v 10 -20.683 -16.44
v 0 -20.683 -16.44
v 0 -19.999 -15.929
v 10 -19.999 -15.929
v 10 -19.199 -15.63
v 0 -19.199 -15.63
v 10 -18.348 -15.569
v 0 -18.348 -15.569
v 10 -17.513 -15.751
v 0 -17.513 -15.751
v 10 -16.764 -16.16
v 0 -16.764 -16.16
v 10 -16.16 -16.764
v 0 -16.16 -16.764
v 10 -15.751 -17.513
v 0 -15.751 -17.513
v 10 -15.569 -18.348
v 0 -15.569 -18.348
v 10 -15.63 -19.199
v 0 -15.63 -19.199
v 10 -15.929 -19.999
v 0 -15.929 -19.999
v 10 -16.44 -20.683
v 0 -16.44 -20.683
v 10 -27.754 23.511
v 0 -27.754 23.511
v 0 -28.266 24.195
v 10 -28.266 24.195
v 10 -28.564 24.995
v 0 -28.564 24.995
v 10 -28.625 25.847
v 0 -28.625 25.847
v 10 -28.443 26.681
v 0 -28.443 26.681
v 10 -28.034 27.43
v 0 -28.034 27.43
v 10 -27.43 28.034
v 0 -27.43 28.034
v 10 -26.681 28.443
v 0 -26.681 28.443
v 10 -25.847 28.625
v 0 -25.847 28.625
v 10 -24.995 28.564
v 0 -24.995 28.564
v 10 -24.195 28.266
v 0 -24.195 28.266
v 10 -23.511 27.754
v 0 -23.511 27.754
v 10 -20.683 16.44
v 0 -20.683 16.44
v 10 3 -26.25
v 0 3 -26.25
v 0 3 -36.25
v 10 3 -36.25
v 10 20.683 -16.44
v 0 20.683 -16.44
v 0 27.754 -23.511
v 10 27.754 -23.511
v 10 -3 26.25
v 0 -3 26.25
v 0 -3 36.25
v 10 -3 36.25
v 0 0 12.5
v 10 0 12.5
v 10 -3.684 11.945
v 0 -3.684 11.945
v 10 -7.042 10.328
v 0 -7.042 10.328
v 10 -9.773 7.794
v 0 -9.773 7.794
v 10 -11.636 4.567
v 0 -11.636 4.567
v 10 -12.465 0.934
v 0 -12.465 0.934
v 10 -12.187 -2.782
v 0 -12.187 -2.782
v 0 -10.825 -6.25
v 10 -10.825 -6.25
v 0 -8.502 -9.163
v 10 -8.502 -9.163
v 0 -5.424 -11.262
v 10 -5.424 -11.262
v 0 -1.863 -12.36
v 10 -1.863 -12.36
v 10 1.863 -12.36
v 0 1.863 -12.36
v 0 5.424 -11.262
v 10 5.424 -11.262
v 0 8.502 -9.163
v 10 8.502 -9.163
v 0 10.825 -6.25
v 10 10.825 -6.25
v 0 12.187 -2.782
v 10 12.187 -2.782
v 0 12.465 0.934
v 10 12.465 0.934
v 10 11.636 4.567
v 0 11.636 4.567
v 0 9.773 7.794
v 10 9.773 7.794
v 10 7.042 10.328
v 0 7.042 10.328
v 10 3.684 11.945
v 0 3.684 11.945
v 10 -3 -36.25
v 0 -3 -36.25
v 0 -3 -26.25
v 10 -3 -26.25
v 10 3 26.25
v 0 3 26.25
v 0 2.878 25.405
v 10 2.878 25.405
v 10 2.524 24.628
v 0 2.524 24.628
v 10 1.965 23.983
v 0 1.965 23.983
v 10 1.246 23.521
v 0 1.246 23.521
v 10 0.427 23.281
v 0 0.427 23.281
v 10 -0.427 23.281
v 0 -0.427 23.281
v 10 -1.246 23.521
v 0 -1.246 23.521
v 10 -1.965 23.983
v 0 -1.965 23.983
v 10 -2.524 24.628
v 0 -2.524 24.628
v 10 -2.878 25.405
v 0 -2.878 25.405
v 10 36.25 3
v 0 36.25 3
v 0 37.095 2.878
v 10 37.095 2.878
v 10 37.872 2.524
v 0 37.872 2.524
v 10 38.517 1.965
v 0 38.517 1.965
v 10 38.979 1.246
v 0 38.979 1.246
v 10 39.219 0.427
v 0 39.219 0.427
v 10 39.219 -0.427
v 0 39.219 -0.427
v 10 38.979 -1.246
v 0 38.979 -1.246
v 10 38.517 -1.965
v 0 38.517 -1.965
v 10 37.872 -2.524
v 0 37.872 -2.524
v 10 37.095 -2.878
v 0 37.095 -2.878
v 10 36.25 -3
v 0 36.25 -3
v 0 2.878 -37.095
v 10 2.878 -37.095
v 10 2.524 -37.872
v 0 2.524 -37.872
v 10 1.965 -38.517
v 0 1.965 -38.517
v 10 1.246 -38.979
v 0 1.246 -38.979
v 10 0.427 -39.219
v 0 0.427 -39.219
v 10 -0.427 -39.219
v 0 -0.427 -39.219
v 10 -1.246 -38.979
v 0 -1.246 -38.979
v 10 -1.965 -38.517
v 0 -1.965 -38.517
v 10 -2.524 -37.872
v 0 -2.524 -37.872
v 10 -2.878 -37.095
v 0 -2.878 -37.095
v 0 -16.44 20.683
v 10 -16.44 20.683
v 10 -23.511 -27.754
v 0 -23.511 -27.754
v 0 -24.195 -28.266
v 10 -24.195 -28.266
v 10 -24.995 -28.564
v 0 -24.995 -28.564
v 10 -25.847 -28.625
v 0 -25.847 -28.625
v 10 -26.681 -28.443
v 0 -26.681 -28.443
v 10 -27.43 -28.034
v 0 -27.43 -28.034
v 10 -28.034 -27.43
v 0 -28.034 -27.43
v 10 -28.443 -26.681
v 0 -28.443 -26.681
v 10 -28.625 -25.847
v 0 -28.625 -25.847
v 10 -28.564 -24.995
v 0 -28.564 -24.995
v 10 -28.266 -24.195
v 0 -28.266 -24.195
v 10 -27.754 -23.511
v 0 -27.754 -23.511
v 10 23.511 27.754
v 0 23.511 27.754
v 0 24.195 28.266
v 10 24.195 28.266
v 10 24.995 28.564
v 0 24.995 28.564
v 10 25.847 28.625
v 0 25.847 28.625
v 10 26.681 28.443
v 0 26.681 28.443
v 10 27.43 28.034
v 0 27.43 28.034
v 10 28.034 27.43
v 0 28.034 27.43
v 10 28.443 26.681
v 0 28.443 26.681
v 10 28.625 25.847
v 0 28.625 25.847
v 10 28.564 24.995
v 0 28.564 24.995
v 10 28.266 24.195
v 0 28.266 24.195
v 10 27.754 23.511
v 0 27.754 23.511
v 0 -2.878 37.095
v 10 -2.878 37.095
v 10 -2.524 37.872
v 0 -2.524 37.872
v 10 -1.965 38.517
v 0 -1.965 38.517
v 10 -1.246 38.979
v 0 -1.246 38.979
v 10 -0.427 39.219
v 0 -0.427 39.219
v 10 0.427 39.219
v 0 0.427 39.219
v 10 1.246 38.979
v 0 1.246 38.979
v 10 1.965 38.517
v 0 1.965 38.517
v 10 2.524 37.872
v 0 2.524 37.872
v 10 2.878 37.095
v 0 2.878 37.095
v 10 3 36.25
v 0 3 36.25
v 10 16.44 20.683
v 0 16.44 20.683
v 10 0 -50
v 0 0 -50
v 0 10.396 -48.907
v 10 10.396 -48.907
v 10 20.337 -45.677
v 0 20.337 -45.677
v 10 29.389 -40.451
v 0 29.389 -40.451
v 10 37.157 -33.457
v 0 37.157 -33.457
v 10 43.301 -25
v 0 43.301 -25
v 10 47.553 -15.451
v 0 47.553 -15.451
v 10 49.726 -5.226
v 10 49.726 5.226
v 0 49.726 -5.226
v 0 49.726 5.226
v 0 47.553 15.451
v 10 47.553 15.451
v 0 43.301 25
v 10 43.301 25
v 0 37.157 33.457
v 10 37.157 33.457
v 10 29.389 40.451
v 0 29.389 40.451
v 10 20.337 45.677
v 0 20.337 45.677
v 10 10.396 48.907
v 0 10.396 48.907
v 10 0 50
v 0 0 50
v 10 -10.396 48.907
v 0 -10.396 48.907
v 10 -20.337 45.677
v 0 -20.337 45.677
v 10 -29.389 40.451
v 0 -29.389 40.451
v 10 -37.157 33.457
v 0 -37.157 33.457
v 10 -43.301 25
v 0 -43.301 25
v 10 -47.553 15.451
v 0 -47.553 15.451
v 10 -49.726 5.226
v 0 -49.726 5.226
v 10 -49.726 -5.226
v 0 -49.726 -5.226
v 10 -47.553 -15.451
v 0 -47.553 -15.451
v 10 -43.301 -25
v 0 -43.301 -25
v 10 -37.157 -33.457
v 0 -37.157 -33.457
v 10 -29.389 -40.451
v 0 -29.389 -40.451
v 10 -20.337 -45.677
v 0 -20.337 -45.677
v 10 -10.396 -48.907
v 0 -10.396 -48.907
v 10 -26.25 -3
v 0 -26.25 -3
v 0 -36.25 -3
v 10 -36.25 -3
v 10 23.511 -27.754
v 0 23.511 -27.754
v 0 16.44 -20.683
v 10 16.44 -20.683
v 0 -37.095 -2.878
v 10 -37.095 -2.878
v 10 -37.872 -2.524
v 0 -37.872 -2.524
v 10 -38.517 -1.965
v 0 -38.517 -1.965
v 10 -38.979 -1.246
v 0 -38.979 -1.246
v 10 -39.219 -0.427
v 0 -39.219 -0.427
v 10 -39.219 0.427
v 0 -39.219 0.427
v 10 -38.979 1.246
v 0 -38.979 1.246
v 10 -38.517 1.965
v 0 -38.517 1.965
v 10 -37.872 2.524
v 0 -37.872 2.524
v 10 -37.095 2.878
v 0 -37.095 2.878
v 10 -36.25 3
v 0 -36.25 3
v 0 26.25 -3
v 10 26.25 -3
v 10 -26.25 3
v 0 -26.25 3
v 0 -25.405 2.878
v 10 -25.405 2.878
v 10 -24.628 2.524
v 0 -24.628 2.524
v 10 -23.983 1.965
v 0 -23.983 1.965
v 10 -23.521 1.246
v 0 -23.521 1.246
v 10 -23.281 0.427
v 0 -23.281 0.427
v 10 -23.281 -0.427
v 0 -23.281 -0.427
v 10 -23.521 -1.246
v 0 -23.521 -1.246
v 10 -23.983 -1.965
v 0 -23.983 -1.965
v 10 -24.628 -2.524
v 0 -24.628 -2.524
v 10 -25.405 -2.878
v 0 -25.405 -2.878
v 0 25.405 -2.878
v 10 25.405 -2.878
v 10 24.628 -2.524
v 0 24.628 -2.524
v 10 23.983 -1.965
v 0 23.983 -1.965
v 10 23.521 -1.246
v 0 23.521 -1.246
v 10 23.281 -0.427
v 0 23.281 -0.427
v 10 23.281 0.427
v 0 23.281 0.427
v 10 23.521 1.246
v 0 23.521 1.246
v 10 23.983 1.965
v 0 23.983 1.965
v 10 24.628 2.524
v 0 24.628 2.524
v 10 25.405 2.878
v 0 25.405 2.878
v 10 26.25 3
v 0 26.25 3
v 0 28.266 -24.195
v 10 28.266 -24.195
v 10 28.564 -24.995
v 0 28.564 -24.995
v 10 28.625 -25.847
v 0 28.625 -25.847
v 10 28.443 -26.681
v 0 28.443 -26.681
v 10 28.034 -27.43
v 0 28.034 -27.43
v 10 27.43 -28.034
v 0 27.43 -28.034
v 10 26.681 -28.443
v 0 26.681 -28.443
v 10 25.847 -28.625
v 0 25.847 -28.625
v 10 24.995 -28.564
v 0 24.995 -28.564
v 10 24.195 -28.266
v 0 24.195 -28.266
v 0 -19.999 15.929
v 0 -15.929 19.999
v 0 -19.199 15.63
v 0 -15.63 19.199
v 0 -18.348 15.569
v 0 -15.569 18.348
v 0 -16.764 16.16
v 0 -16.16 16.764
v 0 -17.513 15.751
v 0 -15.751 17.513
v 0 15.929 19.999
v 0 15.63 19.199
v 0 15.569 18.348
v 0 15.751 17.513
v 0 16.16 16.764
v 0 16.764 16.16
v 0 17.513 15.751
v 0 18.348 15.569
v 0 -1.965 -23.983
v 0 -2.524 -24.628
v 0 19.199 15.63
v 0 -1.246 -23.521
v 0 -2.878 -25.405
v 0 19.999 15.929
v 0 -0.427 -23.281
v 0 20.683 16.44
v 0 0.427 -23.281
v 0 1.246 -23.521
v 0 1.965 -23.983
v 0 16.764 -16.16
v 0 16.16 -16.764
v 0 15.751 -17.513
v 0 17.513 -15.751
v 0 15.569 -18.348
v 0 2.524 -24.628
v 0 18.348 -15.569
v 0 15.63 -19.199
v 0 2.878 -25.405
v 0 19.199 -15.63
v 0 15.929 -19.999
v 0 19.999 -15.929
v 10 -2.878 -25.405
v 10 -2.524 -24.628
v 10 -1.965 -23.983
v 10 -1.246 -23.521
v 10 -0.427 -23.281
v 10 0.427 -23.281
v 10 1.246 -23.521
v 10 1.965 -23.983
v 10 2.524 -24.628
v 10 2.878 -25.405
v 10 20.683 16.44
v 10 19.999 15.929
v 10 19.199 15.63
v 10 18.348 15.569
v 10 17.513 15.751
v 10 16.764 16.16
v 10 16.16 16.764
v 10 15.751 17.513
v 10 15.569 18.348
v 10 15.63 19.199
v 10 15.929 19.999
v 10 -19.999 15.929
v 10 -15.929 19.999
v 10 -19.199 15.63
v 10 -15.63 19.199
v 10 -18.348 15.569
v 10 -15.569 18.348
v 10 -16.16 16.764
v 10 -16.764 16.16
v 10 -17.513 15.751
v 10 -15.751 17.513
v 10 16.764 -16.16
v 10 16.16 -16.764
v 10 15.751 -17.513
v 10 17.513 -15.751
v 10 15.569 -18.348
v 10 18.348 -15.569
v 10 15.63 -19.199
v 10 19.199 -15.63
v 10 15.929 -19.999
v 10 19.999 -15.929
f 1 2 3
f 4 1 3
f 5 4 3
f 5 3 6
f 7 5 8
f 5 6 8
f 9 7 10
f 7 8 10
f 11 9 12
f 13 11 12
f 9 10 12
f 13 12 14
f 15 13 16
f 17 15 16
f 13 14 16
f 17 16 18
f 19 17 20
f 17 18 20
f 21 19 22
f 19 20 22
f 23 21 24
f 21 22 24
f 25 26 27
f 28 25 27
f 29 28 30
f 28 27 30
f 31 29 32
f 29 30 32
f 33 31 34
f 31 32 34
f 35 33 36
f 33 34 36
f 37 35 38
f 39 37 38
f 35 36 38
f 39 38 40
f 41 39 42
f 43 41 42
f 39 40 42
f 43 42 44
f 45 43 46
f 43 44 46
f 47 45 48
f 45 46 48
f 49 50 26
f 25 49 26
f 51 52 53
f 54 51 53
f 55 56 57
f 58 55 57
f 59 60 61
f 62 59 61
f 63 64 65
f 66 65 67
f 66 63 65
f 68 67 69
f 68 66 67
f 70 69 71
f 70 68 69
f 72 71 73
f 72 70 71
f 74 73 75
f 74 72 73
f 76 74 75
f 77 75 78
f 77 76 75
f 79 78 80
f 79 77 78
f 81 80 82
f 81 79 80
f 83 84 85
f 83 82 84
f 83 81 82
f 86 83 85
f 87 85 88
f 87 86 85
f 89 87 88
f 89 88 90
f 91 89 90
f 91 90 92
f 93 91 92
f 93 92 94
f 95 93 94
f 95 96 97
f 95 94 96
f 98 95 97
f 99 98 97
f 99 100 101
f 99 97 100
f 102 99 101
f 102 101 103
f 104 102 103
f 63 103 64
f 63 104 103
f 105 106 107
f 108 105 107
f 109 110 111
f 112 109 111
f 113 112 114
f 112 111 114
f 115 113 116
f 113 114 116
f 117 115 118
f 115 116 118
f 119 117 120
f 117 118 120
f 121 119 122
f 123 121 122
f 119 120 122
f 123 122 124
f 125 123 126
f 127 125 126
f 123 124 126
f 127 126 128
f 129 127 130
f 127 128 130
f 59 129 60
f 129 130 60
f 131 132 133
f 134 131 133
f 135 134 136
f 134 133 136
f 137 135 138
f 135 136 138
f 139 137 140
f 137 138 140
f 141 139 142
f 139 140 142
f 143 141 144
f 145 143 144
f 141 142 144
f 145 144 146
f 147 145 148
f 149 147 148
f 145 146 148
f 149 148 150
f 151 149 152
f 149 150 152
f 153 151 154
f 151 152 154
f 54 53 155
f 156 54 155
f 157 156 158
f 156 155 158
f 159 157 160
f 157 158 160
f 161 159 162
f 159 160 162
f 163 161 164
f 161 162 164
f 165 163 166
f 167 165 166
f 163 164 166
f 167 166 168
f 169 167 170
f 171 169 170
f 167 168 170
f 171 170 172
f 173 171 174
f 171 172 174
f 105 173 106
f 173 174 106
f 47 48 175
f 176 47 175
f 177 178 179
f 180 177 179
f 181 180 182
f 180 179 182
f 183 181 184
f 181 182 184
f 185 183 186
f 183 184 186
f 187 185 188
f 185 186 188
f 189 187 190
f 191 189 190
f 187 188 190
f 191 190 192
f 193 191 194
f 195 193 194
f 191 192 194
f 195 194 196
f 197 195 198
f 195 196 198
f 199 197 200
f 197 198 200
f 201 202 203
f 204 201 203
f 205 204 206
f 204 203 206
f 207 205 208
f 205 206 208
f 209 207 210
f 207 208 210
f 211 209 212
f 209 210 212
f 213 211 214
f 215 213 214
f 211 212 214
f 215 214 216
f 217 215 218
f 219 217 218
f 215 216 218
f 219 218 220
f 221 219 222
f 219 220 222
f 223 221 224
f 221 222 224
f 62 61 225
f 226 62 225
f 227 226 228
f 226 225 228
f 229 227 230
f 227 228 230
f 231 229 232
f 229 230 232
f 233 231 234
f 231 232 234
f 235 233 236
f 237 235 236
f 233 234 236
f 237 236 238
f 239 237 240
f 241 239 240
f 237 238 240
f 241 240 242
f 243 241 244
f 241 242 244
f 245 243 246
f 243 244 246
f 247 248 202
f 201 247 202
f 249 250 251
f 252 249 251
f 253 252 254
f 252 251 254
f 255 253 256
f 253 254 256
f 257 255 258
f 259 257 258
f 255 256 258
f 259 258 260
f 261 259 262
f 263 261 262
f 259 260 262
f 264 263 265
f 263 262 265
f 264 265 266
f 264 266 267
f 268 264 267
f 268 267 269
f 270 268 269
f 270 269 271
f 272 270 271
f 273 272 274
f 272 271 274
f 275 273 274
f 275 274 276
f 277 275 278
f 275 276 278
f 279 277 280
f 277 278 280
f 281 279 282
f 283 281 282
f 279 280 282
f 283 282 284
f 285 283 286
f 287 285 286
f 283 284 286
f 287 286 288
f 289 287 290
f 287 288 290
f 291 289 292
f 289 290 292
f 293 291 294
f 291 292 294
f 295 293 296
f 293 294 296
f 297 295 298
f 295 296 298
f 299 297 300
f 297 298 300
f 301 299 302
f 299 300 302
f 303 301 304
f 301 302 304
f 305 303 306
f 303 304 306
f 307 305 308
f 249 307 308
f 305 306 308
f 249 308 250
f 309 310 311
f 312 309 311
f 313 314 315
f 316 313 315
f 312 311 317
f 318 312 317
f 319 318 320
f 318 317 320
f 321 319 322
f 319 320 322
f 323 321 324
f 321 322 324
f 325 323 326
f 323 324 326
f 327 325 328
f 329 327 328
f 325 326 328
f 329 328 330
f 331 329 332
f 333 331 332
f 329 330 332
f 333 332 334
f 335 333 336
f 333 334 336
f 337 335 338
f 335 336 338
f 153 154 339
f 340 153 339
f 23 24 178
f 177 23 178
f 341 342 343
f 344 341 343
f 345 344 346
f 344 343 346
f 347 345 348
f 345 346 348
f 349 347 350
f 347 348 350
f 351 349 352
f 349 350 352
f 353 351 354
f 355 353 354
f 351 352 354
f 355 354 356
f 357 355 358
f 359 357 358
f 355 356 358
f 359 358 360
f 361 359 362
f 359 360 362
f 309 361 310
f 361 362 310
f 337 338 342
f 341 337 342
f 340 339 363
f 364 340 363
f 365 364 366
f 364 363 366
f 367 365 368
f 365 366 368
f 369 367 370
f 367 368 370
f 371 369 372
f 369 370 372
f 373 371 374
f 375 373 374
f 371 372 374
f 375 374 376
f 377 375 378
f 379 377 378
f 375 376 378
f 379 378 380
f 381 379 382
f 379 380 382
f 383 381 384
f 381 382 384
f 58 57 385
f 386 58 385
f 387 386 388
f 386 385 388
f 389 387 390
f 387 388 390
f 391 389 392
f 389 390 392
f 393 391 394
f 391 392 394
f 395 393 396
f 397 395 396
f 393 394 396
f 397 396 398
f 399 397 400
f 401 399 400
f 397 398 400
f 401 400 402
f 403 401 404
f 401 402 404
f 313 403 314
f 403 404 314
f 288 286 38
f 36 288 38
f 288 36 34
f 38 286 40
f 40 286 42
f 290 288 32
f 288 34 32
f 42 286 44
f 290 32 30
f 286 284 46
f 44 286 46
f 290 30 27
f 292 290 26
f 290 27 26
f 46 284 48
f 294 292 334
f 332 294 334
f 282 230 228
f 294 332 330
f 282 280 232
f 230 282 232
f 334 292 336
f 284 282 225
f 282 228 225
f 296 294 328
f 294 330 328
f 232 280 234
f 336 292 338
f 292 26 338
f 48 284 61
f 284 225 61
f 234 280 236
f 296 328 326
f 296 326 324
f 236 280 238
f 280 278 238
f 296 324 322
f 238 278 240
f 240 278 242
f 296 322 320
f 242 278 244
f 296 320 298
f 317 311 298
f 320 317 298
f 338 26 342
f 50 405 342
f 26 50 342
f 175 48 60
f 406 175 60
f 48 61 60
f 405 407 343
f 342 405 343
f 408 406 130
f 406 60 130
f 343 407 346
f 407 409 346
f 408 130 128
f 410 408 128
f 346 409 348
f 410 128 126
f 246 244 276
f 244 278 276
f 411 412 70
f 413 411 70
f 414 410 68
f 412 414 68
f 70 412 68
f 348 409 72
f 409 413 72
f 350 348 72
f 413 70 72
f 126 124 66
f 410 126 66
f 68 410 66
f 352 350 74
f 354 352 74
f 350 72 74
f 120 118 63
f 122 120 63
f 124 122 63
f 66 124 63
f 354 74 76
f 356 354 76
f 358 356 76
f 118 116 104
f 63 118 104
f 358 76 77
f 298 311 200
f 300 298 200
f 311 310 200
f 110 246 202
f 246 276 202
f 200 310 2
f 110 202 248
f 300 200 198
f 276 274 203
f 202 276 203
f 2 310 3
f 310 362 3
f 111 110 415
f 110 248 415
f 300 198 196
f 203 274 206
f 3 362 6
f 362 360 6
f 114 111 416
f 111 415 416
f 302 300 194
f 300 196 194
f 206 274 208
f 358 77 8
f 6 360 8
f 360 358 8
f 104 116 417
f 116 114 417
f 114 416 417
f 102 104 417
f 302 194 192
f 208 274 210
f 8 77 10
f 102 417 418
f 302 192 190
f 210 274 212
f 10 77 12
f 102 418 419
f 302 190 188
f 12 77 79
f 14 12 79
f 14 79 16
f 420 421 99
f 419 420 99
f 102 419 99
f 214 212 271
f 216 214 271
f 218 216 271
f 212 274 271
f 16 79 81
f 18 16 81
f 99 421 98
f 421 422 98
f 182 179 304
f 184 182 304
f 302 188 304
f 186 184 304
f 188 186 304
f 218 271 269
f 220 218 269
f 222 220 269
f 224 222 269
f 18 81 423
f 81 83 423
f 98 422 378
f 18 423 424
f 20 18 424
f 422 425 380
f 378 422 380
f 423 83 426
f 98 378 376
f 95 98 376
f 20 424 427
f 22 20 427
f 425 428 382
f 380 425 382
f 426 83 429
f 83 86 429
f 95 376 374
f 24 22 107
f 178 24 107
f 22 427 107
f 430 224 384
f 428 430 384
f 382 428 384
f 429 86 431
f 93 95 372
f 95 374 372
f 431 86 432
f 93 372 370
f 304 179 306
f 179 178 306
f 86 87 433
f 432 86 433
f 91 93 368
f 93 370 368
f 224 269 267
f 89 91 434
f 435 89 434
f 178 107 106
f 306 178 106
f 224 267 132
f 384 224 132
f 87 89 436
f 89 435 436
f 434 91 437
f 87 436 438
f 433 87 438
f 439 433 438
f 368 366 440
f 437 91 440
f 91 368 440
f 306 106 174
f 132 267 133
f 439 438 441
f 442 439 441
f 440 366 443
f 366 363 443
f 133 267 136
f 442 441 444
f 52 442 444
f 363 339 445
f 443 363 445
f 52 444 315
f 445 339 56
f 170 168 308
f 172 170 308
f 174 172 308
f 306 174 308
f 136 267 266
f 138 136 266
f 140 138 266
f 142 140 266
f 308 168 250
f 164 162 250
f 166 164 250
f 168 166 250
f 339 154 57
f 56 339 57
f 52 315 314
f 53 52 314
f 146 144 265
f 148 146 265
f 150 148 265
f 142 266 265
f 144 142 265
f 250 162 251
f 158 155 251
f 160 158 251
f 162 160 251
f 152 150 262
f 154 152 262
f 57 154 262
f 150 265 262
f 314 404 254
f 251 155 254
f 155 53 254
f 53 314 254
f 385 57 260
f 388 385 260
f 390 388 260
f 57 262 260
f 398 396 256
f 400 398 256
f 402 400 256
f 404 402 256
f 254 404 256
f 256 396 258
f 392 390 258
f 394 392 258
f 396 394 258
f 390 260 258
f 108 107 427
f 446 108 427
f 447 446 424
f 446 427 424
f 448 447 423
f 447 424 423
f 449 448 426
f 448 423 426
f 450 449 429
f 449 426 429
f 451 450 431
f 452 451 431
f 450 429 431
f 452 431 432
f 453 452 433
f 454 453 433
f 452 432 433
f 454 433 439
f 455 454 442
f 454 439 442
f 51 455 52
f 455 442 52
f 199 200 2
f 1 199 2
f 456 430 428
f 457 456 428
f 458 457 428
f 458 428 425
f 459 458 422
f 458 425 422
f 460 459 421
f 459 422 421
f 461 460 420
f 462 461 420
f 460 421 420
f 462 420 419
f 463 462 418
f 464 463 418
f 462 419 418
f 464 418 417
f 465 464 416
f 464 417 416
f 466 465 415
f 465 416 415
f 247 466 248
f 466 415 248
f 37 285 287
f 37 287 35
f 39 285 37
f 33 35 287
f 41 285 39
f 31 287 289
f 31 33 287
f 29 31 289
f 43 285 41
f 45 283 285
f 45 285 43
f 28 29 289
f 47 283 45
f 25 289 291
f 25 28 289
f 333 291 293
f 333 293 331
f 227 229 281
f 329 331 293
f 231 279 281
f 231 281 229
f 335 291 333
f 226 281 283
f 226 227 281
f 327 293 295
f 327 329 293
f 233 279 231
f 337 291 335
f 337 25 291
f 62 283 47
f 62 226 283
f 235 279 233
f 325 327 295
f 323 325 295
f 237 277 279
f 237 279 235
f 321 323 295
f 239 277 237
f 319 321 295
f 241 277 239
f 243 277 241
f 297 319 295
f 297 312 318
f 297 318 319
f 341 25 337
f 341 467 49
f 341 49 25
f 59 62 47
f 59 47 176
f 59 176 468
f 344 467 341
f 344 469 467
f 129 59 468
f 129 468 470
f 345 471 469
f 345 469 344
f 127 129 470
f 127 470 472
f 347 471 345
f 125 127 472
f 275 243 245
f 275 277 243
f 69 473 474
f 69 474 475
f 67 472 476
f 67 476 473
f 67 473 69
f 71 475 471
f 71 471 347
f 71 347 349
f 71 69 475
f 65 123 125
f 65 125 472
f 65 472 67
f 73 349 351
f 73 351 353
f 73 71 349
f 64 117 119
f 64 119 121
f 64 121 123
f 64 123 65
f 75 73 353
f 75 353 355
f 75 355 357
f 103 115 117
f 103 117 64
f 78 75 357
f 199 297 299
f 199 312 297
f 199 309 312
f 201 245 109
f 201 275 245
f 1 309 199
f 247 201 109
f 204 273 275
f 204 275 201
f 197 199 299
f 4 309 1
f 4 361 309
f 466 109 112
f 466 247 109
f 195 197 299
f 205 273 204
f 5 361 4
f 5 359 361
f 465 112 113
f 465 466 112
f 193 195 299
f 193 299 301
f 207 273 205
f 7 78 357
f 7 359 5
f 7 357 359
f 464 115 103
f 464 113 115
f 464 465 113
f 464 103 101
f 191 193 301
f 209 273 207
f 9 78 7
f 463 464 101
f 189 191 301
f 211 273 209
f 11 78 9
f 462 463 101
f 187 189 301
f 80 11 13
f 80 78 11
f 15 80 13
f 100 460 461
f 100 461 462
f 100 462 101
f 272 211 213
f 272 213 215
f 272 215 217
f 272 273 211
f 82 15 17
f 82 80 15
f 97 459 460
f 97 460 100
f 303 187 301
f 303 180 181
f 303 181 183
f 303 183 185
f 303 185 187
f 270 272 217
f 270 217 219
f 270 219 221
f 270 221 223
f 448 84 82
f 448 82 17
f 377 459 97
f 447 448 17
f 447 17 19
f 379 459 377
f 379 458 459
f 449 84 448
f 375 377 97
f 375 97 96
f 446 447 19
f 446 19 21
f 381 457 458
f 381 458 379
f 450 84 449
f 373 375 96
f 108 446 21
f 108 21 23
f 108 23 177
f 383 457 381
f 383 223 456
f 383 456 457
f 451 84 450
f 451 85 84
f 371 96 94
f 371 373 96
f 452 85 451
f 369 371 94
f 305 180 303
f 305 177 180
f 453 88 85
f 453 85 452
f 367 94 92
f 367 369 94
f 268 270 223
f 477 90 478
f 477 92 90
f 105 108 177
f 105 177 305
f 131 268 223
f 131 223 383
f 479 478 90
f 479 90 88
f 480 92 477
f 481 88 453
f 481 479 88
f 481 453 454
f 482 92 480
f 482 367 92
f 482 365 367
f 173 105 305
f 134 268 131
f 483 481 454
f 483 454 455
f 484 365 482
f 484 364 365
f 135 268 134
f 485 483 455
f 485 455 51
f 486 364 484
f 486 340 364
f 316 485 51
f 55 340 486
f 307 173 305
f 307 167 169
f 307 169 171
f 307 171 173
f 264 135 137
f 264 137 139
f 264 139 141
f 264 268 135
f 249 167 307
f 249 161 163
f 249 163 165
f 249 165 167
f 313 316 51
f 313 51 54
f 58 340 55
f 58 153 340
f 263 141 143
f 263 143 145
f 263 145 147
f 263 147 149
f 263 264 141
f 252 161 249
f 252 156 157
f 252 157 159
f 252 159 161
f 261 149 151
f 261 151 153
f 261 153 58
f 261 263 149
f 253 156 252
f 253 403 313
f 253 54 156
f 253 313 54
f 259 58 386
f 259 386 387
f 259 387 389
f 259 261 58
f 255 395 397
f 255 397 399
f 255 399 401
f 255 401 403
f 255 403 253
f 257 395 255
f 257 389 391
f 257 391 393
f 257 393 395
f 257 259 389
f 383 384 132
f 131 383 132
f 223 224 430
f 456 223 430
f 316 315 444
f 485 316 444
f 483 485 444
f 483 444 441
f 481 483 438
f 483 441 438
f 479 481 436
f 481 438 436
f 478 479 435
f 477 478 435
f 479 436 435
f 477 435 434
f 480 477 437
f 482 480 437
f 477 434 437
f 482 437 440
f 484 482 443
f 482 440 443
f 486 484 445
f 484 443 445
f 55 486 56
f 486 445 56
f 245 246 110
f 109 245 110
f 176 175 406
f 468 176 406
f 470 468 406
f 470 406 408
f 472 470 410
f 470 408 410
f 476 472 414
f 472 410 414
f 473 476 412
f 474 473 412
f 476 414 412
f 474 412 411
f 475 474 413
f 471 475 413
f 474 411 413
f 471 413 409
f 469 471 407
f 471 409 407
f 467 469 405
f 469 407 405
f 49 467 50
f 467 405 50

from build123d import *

# Parameters (mm, degrees)
SKETCH1_R             = 50
BOSS_EXTRUDE2_DEPTH   = 10
SKETCH1_4_OUTSIDE_W   = 130.354
SKETCH1_4_OUTSIDE_H   = 130.354
SKETCH1_4_OUTSIDE_R   = 50
SKETCH1_4_OUTSIDE_R_2 = 12.5
CUT_EXTRUDE2_DEPTH    = 13


with BuildPart() as part:
    # Sketch1 → Boss-Extrude2 (new body)
    with BuildSketch(Plane(origin=(0, 0, 0), x_dir=(0, 0, -1), z_dir=(1, 0, 0))):
        Circle(SKETCH1_R)
    extrude(amount=BOSS_EXTRUDE2_DEPTH)

    # Sketch1<4> outside → Cut-Extrude2 (cut)
    # profile 1 of 10: a face of its own
    with BuildSketch(Plane(origin=(0, 0, 0), x_dir=(0, 0, -1), z_dir=(1, 0, 0))):
        Rectangle(SKETCH1_4_OUTSIDE_W, SKETCH1_4_OUTSIDE_H)
        Circle(SKETCH1_4_OUTSIDE_R, mode=Mode.SUBTRACT)
    # profile 2 of 10: a face of its own
    with BuildSketch(Plane(origin=(0, 0, 0), x_dir=(0, 0, -1), z_dir=(1, 0, 0))):
        Circle(SKETCH1_4_OUTSIDE_R_2)
    # profile 3 of 10: a face of its own
    with BuildSketch(Plane(origin=(0, 0, 0), x_dir=(0, 0, -1), z_dir=(1, 0, 0))):
        with BuildLine():
            Line((3, 36.25), (3, 26.25))
            ThreePointArc((3, 26.25), (0, 23.25), (-3, 26.25))
            Line((-3, 26.25), (-3, 36.25))
            ThreePointArc((-3, 36.25), (0, 39.25), (3, 36.25))
        make_face()
    # profile 4 of 10: a face of its own
    with BuildSketch(Plane(origin=(0, 0, 0), x_dir=(0, 0, -1), z_dir=(1, 0, 0))):
        with BuildLine():
            Line((27.753941162, 23.511300474), (20.68287335, 16.440232663))
            ThreePointArc((20.68287335, 16.440232663), (16.440232663, 16.440232663), (16.440232663, 20.68287335))
            Line((16.440232663, 20.68287335), (23.511300474, 27.753941162))
            ThreePointArc((23.511300474, 27.753941162), (27.753941162, 27.753941162), (27.753941162, 23.511300474))
        make_face()
    # profile 5 of 10: a face of its own
    with BuildSketch(Plane(origin=(0, 0, 0), x_dir=(0, 0, -1), z_dir=(1, 0, 0))):
        with BuildLine():
            Line((36.25, -3), (26.25, -3))
            ThreePointArc((26.25, -3), (23.25, 0), (26.25, 3))
            Line((26.25, 3), (36.25, 3))
            ThreePointArc((36.25, 3), (39.25, 0), (36.25, -3))
        make_face()
    # profile 6 of 10: a face of its own
    with BuildSketch(Plane(origin=(0, 0, 0), x_dir=(0, 0, -1), z_dir=(1, 0, 0))):
        with BuildLine():
            Line((23.511300474, -27.753941162), (16.440232663, -20.68287335))
            ThreePointArc((16.440232663, -20.68287335), (16.440232663, -16.440232663), (20.68287335, -16.440232663))
            Line((20.68287335, -16.440232663), (27.753941162, -23.511300474))
            ThreePointArc((27.753941162, -23.511300474), (27.753941162, -27.753941162), (23.511300474, -27.753941162))
        make_face()
    # profile 7 of 10: a face of its own
    with BuildSketch(Plane(origin=(0, 0, 0), x_dir=(0, 0, -1), z_dir=(1, 0, 0))):
        with BuildLine():
            Line((-3, -36.25), (-3, -26.25))
            ThreePointArc((-3, -26.25), (0, -23.25), (3, -26.25))
            Line((3, -26.25), (3, -36.25))
            ThreePointArc((3, -36.25), (0, -39.25), (-3, -36.25))
        make_face()
    # profile 8 of 10: a face of its own
    with BuildSketch(Plane(origin=(0, 0, 0), x_dir=(0, 0, -1), z_dir=(1, 0, 0))):
        with BuildLine():
            Line((-27.753941162, -23.511300474), (-20.68287335, -16.440232663))
            ThreePointArc((-20.68287335, -16.440232663), (-16.440232663, -16.440232663), (-16.440232663, -20.68287335))
            Line((-16.440232663, -20.68287335), (-23.511300474, -27.753941162))
            ThreePointArc((-23.511300474, -27.753941162), (-27.753941162, -27.753941162), (-27.753941162, -23.511300474))
        make_face()
    # profile 9 of 10: a face of its own
    with BuildSketch(Plane(origin=(0, 0, 0), x_dir=(0, 0, -1), z_dir=(1, 0, 0))):
        with BuildLine():
            Line((-36.25, 3), (-26.25, 3))
            ThreePointArc((-26.25, 3), (-23.25, 0), (-26.25, -3))
            Line((-26.25, -3), (-36.25, -3))
            ThreePointArc((-36.25, -3), (-39.25, 0), (-36.25, 3))
        make_face()
    # profile 10 of 10: a face of its own
    with BuildSketch(Plane(origin=(0, 0, 0), x_dir=(0, 0, -1), z_dir=(1, 0, 0))):
        with BuildLine():
            Line((-23.511300474, 27.753941162), (-16.440232663, 20.68287335))
            ThreePointArc((-16.440232663, 20.68287335), (-16.440232663, 16.440232663), (-20.68287335, 16.440232663))
            Line((-20.68287335, 16.440232663), (-27.753941162, 23.511300474))
            ThreePointArc((-27.753941162, 23.511300474), (-27.753941162, 27.753941162), (-23.511300474, 27.753941162))
        make_face()
    extrude(amount=CUT_EXTRUDE2_DEPTH, mode=Mode.SUBTRACT)


solid = part.part
